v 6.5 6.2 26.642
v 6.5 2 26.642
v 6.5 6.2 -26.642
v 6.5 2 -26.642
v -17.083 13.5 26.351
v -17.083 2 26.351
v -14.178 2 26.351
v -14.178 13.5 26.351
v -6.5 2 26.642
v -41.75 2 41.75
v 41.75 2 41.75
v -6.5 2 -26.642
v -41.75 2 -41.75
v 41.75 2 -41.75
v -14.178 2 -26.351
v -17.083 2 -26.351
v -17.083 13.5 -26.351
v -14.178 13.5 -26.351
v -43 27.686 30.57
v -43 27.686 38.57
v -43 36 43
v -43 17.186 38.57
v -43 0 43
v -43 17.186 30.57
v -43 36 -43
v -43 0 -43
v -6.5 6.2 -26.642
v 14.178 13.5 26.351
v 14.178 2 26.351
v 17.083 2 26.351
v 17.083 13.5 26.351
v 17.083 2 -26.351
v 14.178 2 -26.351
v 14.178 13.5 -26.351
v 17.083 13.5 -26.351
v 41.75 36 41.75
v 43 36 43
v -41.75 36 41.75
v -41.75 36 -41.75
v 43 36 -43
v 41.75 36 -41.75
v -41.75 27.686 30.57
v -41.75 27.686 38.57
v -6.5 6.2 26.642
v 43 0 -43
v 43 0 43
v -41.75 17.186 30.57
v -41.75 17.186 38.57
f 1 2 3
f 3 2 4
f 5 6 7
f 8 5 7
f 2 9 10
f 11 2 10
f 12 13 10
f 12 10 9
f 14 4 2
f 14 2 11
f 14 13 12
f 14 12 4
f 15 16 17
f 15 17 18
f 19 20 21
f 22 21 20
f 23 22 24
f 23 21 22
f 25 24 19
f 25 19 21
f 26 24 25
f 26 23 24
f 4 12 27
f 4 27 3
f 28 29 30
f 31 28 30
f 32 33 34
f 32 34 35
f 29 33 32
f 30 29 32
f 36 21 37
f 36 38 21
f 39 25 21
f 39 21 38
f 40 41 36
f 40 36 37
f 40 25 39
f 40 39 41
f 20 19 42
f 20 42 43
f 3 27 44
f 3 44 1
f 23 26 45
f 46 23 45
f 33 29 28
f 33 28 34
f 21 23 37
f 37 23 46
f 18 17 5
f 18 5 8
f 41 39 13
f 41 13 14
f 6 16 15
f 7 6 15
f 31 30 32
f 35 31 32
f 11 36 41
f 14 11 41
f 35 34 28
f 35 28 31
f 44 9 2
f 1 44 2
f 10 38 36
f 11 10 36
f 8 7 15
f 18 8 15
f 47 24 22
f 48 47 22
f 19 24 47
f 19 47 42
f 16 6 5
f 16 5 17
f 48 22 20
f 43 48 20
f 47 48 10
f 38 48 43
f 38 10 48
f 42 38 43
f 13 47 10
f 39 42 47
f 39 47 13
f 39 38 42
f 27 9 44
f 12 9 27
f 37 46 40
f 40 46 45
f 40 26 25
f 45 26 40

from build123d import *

# Parameters (mm, degrees)
SKETCH1_W             = 86
SKETCH1_H             = 86
BOSS_EXTRUDE1_DEPTH   = 36
SKETCH3_W             = 83.5
SKETCH3_H             = 83.5
CUT_EXTRUDE1_DEPTH    = 34
SKETCH4_W             = 13
SKETCH4_H             = 53.28405224
BOSS_EXTRUDE2_DEPTH   = 4.2
BOSS_EXTRUDE4_START   = -4.2
SKETCH5_W             = 2.90534636
SKETCH5_H             = 52.702982968
BOSS_EXTRUDE4_DEPTH   = 11.5
BOSS_EXTRUDE4_2_DEPTH = 11.5
SKETCH7_W             = 8
SKETCH7_H             = 10.5
CUT_EXTRUDE2_DEPTH    = 2


with BuildPart() as part:
    # Sketch1 → Boss-Extrude1 (new body)
    with BuildSketch(Plane(origin=(0, 0, 0), x_dir=(1, 0, 0), z_dir=(0, 1, 0))):
        Rectangle(SKETCH1_W, SKETCH1_H)
    extrude(amount=BOSS_EXTRUDE1_DEPTH)

    # Sketch3 → Cut-Extrude1 (cut)
    with BuildSketch(Plane(origin=(0, 36, 0), x_dir=(1, 0, 0), z_dir=(0, 1, 0))):
        Rectangle(SKETCH3_W, SKETCH3_H)
    extrude(amount=-CUT_EXTRUDE1_DEPTH, mode=Mode.SUBTRACT)

    # Sketch4 → Boss-Extrude2 (add)
    with BuildSketch(Plane(origin=(0, 2, 0), x_dir=(1, 0, 0), z_dir=(0, 1, 0))):
        Rectangle(SKETCH4_W, SKETCH4_H)
    extrude(amount=BOSS_EXTRUDE2_DEPTH)

    # Sketch7 → Cut-Extrude2 (cut)
    with BuildSketch(Plane.ZY.offset(43)):
        with Locations((34.569793539, 22.43634464)):
            Rectangle(SKETCH7_W, SKETCH7_H)
    extrude(amount=-CUT_EXTRUDE2_DEPTH, mode=Mode.SUBTRACT)


with BuildPart() as body_2:
    # Sketch5 → Boss-Extrude4 (new body)
    with BuildSketch(Plane(origin=(0, 6.2, 0), x_dir=(1, 0, 0), z_dir=(0, 1, 0)).offset(BOSS_EXTRUDE4_START)):
        with Locations((15.630763416, 0)):
            Rectangle(SKETCH5_W, SKETCH5_H)
    extrude(amount=BOSS_EXTRUDE4_DEPTH)


with BuildPart() as body_3:
    # Sketch5 → Boss-Extrude4 2 (new body)
    with BuildSketch(Plane(origin=(0, 6.2, 0), x_dir=(1, 0, 0), z_dir=(0, 1, 0)).offset(BOSS_EXTRUDE4_START)):
        with Locations((-15.630763416, 0)):
            Rectangle(SKETCH5_W, SKETCH5_H)
    extrude(amount=BOSS_EXTRUDE4_2_DEPTH)


solid = Compound([part.part, body_2.part, body_3.part])
